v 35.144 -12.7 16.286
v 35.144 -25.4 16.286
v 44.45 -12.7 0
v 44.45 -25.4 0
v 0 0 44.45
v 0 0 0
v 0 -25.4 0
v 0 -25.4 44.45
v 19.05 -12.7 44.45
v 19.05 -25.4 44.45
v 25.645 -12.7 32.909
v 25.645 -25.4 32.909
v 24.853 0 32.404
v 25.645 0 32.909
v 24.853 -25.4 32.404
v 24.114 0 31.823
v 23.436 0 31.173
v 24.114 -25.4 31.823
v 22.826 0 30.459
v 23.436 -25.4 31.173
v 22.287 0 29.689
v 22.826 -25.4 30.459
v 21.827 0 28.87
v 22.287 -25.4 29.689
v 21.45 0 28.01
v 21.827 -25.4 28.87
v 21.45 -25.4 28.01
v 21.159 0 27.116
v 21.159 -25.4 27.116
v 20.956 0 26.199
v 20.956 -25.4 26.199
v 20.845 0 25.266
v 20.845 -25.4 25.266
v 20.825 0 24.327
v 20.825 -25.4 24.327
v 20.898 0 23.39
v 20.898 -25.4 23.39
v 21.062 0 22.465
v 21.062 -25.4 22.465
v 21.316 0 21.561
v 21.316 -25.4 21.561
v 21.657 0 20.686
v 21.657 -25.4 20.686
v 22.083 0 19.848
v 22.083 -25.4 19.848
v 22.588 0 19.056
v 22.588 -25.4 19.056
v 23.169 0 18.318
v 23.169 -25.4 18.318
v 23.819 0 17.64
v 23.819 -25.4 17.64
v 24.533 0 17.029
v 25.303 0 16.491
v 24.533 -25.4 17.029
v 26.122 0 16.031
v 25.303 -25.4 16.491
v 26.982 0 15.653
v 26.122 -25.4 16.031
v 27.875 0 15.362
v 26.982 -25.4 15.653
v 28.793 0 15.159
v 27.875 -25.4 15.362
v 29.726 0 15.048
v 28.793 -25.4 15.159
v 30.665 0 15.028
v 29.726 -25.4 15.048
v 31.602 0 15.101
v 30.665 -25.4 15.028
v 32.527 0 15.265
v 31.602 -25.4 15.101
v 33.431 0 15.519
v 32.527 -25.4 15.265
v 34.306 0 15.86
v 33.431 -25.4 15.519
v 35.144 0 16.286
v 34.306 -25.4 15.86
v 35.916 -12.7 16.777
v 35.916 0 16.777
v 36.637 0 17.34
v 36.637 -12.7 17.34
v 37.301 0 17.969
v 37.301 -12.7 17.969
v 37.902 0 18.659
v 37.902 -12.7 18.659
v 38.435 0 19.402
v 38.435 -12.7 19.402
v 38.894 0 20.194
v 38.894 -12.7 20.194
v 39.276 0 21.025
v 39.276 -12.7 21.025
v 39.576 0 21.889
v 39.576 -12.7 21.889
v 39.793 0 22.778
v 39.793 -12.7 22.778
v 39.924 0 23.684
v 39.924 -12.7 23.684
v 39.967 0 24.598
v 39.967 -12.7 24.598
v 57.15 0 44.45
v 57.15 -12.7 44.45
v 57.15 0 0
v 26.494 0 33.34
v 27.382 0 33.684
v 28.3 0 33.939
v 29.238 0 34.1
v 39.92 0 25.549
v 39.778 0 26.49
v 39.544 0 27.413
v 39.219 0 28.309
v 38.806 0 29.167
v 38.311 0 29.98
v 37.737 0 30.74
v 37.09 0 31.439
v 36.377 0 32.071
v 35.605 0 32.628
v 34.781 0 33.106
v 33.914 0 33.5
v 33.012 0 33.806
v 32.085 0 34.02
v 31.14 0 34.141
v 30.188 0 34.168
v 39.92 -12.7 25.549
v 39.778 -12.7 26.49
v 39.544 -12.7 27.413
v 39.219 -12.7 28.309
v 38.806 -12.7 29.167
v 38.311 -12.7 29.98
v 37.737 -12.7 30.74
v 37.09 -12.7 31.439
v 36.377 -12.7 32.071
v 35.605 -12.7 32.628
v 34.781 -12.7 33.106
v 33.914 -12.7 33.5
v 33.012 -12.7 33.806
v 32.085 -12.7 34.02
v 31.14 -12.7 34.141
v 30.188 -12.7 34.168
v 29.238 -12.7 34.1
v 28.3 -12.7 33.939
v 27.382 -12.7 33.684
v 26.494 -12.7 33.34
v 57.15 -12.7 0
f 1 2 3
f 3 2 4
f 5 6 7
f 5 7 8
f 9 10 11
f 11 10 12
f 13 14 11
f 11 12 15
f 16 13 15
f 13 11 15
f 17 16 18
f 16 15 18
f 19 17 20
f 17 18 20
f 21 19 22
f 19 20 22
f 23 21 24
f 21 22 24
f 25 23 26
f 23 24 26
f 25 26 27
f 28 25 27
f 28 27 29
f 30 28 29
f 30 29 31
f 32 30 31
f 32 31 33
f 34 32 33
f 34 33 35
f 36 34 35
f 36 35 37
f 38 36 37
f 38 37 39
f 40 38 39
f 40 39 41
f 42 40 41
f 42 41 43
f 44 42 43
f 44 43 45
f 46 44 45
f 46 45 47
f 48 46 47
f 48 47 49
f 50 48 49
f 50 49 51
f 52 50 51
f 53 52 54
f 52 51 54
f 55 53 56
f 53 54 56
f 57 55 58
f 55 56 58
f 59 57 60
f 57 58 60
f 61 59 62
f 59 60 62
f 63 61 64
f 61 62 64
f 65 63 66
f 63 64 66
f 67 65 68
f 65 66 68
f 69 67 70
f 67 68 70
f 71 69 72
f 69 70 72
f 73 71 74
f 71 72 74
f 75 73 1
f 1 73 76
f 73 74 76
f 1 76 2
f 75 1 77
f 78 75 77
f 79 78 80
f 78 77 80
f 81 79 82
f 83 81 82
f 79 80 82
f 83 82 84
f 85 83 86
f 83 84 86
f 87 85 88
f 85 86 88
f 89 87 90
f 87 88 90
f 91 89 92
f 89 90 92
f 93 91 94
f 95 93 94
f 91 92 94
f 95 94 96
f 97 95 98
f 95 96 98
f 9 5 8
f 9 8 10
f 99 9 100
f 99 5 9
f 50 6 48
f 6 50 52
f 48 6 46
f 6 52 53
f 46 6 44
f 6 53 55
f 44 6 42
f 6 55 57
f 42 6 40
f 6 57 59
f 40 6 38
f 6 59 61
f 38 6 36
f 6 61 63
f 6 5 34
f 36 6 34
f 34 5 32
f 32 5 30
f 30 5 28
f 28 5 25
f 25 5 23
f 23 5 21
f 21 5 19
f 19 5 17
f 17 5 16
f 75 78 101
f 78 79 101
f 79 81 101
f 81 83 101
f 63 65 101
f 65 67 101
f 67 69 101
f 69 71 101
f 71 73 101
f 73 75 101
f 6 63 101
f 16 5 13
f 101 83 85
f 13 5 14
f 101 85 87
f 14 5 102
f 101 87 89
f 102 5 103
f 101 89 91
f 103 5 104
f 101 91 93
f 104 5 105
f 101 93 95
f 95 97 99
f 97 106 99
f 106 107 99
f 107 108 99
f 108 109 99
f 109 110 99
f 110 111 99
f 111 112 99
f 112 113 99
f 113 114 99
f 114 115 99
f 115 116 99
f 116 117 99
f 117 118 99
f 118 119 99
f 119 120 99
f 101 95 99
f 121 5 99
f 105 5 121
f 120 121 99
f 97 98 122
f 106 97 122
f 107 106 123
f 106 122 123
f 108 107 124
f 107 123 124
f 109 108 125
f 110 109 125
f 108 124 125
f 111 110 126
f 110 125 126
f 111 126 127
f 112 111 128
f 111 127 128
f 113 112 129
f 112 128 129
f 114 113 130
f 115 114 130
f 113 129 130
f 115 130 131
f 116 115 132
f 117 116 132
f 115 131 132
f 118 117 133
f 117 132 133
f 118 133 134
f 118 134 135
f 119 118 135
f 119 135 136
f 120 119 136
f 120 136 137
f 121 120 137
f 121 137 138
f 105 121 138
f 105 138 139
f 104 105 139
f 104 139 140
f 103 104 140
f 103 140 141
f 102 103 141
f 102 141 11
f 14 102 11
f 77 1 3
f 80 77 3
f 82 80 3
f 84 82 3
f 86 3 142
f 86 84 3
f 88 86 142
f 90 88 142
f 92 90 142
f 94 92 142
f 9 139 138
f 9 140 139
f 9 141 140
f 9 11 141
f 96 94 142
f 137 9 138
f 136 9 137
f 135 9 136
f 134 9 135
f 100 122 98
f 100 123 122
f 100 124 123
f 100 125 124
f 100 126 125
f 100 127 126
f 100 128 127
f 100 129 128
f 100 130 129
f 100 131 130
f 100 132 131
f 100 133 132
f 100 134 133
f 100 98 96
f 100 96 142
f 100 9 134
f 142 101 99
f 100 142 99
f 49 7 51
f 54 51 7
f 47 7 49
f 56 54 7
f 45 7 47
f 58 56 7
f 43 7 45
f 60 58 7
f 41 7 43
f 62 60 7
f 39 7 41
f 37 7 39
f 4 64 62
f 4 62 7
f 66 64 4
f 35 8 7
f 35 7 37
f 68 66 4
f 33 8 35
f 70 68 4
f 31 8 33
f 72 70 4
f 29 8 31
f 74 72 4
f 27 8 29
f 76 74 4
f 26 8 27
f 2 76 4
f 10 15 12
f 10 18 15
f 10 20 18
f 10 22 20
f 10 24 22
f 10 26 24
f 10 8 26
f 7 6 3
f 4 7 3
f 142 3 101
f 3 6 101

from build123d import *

# Parameters (mm, degrees)
F0_W     = 57.15
F0_H     = 44.45
F1_DEPTH = 25.4
F3_DEPTH = 12.7
F5_DEPTH = 25.4


with BuildPart() as f1:
    # F0 (on Front) → F1 (new body)
    with BuildSketch(Plane.XZ):
        with Locations((28.575, 22.225)):
            Rectangle(F0_W, F0_H)
    extrude(amount=F1_DEPTH)

    # F2 (on face) → F3 (cut)
    with BuildSketch(Plane.XZ.offset(25.4)):
        Polygon((19.05, 44.45), (44.45, 0), (57.15, 0), (57.15, 44.45), align=None)
    extrude(amount=-F3_DEPTH, mode=Mode.SUBTRACT)

    # F4 (on face) → F5 (cut)
    with BuildSketch(Plane.XZ.offset(25.4)):
        with BuildLine():
            ThreePointArc((35.143775, 16.285894), (38.674012, 19.792631), (39.967225, 24.597564))
            ThreePointArc((39.967225, 24.597564), (35.199182, 32.877327), (25.644724, 32.909234))
            Line((25.644724, 32.909234), (35.143775, 16.285894))
        make_face()
        with BuildLine():
            Line((35.143775, 16.285894), (25.644724, 32.909234))
            ThreePointArc((25.644724, 32.909234), (22.082579, 19.848038), (35.143775, 16.285894))
        make_face()
    extrude(amount=-F5_DEPTH, mode=Mode.SUBTRACT)


solid = f1.part
